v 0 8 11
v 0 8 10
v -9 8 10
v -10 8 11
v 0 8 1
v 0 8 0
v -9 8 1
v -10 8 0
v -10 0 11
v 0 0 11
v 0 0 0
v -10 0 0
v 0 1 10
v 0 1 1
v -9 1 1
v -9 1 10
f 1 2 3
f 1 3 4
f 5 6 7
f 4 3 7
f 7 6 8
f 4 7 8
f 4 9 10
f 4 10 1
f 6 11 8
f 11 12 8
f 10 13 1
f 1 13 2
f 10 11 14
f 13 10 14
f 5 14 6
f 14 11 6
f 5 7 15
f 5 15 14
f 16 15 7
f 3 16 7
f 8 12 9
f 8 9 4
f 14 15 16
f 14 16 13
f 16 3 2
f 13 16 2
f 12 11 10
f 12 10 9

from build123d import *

# Parameters (mm, degrees)
BOX102_W     = 9
BOX102_H     = 8
BOX102_DEPTH = 1
BOX005_W     = 8
BOX005_H     = 1
BOX005_DEPTH = 11
BOX006_W     = 9
BOX006_H     = 1
BOX006_DEPTH = 11
BOX100_W     = 9
BOX100_H     = 7
BOX100_DEPTH = 1


with BuildPart() as box102:
    # Box102 → Box102 (new body)
    with BuildSketch(Plane(origin=(-9, 0, 0), x_dir=(1, 0, 0), z_dir=(0, 0, 1))):
        with Locations((4.5, 4)):
            Rectangle(BOX102_W, BOX102_H)
    extrude(amount=BOX102_DEPTH)


with BuildPart() as box005:
    # Box005 → Box005 (new body)
    with BuildSketch(Plane(origin=(-9, 0, 0), x_dir=(0, 1, 0), z_dir=(0, 0, 1))):
        with Locations((4, 0.5)):
            Rectangle(BOX005_W, BOX005_H)
    extrude(amount=BOX005_DEPTH)


with BuildPart() as box006:
    # Box006 → Box006 (new body)
    with BuildSketch(Plane(origin=(-9, 0, 0), x_dir=(1, 0, 0), z_dir=(0, 0, 1))):
        with Locations((4.5, 0.5)):
            Rectangle(BOX006_W, BOX006_H)
    extrude(amount=BOX006_DEPTH)


with BuildPart() as fusion043:
    # Box100 → Box100 (new body)
    with BuildSketch(Plane(origin=(-9, 1, 10), x_dir=(1, 0, 0), z_dir=(0, 0, 1))):
        with Locations((4.5, 3.5)):
            Rectangle(BOX100_W, BOX100_H)
    extrude(amount=BOX100_DEPTH)

    # Fusion041: union Box006
    add(box006.part)

    # Fusion042: union Box005
    add(box005.part)

    # Fusion043: union Box102
    add(box102.part)


solid = fusion043.part
